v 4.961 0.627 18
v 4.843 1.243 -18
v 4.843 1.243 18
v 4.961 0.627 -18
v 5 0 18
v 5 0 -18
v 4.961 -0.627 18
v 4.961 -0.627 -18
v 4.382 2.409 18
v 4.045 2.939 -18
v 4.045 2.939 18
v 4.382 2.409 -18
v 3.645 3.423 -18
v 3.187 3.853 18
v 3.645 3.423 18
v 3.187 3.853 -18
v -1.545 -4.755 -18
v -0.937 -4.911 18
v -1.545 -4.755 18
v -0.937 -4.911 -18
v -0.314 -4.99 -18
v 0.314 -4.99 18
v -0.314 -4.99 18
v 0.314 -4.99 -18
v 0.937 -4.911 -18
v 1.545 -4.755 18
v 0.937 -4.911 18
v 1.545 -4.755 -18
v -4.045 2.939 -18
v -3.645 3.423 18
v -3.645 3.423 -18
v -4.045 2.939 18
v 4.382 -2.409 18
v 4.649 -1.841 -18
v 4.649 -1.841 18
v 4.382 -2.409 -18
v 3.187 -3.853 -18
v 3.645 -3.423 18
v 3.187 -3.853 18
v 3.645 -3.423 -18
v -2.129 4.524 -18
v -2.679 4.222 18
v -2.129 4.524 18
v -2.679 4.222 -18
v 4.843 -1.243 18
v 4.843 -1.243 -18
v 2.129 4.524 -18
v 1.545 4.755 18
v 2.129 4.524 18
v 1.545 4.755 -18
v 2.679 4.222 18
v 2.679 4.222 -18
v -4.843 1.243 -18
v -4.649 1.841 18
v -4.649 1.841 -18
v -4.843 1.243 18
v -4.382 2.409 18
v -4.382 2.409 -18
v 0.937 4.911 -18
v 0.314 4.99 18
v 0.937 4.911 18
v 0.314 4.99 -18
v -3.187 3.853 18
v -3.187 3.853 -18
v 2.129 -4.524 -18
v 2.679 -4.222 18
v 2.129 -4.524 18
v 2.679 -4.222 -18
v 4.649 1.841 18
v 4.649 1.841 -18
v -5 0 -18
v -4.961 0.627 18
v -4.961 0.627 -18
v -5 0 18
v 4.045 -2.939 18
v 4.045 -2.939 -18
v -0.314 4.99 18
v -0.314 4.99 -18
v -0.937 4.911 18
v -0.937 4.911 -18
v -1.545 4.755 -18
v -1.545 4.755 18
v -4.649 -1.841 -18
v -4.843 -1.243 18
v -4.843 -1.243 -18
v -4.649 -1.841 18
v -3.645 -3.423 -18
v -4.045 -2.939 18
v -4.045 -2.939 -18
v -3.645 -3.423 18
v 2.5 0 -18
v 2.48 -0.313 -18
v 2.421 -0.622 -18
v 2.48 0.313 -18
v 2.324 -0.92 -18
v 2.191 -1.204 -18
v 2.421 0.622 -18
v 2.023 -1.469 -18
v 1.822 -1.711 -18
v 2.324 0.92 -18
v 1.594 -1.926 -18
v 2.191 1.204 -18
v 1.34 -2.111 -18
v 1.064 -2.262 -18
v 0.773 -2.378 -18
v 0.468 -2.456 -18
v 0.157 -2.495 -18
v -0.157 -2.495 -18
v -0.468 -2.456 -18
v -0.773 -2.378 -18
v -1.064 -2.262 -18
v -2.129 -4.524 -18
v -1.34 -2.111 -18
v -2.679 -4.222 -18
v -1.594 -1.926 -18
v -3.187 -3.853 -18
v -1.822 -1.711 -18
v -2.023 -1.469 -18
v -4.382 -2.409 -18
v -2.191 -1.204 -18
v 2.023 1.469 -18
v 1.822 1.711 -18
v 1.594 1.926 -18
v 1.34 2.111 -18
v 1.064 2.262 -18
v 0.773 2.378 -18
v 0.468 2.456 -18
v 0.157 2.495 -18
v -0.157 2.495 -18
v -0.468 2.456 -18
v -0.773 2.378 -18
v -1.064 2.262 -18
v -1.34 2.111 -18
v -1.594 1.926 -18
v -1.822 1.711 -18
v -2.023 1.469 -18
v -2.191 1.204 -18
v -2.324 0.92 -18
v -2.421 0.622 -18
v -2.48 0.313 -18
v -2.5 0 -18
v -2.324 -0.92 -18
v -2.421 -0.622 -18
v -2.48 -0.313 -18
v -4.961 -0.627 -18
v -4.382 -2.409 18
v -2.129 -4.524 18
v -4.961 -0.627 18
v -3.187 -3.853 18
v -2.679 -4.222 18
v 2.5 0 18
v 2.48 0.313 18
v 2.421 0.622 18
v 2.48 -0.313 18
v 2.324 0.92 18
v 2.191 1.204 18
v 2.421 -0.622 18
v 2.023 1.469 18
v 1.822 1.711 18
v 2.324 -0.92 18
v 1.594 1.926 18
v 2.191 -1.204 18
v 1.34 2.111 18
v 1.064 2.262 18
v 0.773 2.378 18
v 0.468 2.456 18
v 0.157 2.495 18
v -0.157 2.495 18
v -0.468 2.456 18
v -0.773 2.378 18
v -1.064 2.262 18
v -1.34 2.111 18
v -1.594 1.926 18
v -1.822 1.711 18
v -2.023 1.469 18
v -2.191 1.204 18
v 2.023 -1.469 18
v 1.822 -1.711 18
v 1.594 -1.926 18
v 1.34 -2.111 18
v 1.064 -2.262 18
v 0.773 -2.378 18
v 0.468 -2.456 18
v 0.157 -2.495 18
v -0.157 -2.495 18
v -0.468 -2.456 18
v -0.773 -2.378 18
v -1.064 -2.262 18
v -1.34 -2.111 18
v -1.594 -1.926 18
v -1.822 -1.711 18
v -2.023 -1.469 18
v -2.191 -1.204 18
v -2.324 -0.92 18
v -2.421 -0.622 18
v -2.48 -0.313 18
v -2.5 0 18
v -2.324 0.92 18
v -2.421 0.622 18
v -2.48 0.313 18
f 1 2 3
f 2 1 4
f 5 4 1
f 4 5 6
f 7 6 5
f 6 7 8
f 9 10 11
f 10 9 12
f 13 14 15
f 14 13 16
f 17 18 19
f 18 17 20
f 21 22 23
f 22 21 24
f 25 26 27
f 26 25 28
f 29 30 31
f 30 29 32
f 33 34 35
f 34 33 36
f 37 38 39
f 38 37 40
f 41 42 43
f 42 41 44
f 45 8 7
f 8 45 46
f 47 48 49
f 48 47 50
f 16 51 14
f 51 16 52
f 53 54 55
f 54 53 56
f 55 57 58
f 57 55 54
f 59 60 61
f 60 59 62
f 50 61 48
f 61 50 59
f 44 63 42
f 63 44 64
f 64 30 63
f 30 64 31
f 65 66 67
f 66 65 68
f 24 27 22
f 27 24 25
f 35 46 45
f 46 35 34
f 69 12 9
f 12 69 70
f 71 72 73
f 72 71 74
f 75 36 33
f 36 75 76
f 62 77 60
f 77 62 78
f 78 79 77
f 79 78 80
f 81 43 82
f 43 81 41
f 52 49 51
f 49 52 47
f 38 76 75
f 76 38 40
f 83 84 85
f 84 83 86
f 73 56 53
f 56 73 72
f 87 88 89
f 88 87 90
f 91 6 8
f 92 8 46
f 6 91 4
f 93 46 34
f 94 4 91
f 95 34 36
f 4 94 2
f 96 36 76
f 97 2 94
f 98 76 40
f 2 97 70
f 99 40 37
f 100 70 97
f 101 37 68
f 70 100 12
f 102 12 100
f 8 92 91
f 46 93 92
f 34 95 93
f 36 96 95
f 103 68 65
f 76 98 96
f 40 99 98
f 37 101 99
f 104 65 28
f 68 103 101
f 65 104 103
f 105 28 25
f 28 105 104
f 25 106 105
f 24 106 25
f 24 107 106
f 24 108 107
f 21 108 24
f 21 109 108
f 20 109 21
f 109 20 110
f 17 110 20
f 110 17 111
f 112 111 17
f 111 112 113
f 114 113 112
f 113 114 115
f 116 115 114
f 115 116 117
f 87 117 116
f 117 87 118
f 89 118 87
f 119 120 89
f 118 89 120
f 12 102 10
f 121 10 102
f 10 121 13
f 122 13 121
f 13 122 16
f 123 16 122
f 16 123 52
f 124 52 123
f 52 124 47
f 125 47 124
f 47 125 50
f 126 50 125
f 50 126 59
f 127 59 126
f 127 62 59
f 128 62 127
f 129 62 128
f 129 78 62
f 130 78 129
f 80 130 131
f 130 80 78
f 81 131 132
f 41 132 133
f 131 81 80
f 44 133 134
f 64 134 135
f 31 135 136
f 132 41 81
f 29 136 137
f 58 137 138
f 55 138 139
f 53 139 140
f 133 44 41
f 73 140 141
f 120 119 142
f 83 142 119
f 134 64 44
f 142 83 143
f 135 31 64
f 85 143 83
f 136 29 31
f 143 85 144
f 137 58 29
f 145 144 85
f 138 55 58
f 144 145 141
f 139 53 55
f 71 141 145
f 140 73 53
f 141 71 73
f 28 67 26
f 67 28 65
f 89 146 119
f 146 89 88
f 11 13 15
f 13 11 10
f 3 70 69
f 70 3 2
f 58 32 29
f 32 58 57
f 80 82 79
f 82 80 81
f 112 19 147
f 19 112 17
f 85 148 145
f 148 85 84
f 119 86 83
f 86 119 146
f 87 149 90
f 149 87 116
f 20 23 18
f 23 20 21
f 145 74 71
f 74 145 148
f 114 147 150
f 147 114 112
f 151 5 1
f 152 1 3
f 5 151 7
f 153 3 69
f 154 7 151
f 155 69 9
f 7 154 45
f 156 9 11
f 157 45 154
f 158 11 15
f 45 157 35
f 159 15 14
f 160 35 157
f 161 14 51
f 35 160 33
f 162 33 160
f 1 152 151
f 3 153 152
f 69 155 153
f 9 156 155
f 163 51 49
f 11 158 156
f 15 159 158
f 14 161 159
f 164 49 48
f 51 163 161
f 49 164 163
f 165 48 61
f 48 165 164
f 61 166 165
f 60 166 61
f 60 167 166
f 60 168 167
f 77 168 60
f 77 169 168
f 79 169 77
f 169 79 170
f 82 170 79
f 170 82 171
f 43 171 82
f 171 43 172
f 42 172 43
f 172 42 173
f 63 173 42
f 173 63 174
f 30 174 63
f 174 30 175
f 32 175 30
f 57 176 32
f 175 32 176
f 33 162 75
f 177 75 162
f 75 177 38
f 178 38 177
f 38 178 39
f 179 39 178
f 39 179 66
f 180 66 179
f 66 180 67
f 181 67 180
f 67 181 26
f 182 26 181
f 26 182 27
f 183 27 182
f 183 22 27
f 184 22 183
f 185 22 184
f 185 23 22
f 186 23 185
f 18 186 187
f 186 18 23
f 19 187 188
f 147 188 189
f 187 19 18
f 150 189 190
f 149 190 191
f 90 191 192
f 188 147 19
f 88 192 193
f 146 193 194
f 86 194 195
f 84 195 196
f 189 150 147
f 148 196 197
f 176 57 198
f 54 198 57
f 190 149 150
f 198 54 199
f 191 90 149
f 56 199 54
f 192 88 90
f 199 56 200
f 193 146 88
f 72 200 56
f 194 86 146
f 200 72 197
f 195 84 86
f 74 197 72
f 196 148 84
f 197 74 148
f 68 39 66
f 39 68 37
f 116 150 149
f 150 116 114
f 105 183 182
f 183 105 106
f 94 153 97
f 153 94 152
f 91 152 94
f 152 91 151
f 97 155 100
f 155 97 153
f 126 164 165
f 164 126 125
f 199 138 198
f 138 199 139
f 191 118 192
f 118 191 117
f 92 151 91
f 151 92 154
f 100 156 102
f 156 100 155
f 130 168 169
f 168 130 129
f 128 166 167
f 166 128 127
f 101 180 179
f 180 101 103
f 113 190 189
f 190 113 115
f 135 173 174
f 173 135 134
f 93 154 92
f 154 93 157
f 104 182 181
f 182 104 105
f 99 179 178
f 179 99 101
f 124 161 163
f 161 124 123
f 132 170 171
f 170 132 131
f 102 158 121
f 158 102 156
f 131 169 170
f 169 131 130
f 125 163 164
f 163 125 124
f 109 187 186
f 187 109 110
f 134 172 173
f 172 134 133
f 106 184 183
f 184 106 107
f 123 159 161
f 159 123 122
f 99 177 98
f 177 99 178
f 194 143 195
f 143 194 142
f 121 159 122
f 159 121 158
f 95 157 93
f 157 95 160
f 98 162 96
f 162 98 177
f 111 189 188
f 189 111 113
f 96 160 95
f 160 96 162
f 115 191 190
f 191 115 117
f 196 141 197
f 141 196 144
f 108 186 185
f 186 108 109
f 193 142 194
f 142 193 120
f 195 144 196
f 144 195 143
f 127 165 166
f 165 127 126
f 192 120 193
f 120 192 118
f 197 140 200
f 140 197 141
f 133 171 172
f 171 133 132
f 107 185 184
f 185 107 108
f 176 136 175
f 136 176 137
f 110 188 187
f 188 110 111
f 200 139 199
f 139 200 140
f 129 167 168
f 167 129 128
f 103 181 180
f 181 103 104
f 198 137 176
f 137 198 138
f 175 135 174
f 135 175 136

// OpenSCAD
$fn = 50;


difference() {
	union() {
		translate(v = [0, 0, -18.0000000000]) {
			cylinder(h = 36, r = 5.0000000000);
		}
	}
	union() {
		translate(v = [0, 0, -100.0000000000]) {
			cylinder(h = 200, r = 2.5000000000);
		}
	}
}
